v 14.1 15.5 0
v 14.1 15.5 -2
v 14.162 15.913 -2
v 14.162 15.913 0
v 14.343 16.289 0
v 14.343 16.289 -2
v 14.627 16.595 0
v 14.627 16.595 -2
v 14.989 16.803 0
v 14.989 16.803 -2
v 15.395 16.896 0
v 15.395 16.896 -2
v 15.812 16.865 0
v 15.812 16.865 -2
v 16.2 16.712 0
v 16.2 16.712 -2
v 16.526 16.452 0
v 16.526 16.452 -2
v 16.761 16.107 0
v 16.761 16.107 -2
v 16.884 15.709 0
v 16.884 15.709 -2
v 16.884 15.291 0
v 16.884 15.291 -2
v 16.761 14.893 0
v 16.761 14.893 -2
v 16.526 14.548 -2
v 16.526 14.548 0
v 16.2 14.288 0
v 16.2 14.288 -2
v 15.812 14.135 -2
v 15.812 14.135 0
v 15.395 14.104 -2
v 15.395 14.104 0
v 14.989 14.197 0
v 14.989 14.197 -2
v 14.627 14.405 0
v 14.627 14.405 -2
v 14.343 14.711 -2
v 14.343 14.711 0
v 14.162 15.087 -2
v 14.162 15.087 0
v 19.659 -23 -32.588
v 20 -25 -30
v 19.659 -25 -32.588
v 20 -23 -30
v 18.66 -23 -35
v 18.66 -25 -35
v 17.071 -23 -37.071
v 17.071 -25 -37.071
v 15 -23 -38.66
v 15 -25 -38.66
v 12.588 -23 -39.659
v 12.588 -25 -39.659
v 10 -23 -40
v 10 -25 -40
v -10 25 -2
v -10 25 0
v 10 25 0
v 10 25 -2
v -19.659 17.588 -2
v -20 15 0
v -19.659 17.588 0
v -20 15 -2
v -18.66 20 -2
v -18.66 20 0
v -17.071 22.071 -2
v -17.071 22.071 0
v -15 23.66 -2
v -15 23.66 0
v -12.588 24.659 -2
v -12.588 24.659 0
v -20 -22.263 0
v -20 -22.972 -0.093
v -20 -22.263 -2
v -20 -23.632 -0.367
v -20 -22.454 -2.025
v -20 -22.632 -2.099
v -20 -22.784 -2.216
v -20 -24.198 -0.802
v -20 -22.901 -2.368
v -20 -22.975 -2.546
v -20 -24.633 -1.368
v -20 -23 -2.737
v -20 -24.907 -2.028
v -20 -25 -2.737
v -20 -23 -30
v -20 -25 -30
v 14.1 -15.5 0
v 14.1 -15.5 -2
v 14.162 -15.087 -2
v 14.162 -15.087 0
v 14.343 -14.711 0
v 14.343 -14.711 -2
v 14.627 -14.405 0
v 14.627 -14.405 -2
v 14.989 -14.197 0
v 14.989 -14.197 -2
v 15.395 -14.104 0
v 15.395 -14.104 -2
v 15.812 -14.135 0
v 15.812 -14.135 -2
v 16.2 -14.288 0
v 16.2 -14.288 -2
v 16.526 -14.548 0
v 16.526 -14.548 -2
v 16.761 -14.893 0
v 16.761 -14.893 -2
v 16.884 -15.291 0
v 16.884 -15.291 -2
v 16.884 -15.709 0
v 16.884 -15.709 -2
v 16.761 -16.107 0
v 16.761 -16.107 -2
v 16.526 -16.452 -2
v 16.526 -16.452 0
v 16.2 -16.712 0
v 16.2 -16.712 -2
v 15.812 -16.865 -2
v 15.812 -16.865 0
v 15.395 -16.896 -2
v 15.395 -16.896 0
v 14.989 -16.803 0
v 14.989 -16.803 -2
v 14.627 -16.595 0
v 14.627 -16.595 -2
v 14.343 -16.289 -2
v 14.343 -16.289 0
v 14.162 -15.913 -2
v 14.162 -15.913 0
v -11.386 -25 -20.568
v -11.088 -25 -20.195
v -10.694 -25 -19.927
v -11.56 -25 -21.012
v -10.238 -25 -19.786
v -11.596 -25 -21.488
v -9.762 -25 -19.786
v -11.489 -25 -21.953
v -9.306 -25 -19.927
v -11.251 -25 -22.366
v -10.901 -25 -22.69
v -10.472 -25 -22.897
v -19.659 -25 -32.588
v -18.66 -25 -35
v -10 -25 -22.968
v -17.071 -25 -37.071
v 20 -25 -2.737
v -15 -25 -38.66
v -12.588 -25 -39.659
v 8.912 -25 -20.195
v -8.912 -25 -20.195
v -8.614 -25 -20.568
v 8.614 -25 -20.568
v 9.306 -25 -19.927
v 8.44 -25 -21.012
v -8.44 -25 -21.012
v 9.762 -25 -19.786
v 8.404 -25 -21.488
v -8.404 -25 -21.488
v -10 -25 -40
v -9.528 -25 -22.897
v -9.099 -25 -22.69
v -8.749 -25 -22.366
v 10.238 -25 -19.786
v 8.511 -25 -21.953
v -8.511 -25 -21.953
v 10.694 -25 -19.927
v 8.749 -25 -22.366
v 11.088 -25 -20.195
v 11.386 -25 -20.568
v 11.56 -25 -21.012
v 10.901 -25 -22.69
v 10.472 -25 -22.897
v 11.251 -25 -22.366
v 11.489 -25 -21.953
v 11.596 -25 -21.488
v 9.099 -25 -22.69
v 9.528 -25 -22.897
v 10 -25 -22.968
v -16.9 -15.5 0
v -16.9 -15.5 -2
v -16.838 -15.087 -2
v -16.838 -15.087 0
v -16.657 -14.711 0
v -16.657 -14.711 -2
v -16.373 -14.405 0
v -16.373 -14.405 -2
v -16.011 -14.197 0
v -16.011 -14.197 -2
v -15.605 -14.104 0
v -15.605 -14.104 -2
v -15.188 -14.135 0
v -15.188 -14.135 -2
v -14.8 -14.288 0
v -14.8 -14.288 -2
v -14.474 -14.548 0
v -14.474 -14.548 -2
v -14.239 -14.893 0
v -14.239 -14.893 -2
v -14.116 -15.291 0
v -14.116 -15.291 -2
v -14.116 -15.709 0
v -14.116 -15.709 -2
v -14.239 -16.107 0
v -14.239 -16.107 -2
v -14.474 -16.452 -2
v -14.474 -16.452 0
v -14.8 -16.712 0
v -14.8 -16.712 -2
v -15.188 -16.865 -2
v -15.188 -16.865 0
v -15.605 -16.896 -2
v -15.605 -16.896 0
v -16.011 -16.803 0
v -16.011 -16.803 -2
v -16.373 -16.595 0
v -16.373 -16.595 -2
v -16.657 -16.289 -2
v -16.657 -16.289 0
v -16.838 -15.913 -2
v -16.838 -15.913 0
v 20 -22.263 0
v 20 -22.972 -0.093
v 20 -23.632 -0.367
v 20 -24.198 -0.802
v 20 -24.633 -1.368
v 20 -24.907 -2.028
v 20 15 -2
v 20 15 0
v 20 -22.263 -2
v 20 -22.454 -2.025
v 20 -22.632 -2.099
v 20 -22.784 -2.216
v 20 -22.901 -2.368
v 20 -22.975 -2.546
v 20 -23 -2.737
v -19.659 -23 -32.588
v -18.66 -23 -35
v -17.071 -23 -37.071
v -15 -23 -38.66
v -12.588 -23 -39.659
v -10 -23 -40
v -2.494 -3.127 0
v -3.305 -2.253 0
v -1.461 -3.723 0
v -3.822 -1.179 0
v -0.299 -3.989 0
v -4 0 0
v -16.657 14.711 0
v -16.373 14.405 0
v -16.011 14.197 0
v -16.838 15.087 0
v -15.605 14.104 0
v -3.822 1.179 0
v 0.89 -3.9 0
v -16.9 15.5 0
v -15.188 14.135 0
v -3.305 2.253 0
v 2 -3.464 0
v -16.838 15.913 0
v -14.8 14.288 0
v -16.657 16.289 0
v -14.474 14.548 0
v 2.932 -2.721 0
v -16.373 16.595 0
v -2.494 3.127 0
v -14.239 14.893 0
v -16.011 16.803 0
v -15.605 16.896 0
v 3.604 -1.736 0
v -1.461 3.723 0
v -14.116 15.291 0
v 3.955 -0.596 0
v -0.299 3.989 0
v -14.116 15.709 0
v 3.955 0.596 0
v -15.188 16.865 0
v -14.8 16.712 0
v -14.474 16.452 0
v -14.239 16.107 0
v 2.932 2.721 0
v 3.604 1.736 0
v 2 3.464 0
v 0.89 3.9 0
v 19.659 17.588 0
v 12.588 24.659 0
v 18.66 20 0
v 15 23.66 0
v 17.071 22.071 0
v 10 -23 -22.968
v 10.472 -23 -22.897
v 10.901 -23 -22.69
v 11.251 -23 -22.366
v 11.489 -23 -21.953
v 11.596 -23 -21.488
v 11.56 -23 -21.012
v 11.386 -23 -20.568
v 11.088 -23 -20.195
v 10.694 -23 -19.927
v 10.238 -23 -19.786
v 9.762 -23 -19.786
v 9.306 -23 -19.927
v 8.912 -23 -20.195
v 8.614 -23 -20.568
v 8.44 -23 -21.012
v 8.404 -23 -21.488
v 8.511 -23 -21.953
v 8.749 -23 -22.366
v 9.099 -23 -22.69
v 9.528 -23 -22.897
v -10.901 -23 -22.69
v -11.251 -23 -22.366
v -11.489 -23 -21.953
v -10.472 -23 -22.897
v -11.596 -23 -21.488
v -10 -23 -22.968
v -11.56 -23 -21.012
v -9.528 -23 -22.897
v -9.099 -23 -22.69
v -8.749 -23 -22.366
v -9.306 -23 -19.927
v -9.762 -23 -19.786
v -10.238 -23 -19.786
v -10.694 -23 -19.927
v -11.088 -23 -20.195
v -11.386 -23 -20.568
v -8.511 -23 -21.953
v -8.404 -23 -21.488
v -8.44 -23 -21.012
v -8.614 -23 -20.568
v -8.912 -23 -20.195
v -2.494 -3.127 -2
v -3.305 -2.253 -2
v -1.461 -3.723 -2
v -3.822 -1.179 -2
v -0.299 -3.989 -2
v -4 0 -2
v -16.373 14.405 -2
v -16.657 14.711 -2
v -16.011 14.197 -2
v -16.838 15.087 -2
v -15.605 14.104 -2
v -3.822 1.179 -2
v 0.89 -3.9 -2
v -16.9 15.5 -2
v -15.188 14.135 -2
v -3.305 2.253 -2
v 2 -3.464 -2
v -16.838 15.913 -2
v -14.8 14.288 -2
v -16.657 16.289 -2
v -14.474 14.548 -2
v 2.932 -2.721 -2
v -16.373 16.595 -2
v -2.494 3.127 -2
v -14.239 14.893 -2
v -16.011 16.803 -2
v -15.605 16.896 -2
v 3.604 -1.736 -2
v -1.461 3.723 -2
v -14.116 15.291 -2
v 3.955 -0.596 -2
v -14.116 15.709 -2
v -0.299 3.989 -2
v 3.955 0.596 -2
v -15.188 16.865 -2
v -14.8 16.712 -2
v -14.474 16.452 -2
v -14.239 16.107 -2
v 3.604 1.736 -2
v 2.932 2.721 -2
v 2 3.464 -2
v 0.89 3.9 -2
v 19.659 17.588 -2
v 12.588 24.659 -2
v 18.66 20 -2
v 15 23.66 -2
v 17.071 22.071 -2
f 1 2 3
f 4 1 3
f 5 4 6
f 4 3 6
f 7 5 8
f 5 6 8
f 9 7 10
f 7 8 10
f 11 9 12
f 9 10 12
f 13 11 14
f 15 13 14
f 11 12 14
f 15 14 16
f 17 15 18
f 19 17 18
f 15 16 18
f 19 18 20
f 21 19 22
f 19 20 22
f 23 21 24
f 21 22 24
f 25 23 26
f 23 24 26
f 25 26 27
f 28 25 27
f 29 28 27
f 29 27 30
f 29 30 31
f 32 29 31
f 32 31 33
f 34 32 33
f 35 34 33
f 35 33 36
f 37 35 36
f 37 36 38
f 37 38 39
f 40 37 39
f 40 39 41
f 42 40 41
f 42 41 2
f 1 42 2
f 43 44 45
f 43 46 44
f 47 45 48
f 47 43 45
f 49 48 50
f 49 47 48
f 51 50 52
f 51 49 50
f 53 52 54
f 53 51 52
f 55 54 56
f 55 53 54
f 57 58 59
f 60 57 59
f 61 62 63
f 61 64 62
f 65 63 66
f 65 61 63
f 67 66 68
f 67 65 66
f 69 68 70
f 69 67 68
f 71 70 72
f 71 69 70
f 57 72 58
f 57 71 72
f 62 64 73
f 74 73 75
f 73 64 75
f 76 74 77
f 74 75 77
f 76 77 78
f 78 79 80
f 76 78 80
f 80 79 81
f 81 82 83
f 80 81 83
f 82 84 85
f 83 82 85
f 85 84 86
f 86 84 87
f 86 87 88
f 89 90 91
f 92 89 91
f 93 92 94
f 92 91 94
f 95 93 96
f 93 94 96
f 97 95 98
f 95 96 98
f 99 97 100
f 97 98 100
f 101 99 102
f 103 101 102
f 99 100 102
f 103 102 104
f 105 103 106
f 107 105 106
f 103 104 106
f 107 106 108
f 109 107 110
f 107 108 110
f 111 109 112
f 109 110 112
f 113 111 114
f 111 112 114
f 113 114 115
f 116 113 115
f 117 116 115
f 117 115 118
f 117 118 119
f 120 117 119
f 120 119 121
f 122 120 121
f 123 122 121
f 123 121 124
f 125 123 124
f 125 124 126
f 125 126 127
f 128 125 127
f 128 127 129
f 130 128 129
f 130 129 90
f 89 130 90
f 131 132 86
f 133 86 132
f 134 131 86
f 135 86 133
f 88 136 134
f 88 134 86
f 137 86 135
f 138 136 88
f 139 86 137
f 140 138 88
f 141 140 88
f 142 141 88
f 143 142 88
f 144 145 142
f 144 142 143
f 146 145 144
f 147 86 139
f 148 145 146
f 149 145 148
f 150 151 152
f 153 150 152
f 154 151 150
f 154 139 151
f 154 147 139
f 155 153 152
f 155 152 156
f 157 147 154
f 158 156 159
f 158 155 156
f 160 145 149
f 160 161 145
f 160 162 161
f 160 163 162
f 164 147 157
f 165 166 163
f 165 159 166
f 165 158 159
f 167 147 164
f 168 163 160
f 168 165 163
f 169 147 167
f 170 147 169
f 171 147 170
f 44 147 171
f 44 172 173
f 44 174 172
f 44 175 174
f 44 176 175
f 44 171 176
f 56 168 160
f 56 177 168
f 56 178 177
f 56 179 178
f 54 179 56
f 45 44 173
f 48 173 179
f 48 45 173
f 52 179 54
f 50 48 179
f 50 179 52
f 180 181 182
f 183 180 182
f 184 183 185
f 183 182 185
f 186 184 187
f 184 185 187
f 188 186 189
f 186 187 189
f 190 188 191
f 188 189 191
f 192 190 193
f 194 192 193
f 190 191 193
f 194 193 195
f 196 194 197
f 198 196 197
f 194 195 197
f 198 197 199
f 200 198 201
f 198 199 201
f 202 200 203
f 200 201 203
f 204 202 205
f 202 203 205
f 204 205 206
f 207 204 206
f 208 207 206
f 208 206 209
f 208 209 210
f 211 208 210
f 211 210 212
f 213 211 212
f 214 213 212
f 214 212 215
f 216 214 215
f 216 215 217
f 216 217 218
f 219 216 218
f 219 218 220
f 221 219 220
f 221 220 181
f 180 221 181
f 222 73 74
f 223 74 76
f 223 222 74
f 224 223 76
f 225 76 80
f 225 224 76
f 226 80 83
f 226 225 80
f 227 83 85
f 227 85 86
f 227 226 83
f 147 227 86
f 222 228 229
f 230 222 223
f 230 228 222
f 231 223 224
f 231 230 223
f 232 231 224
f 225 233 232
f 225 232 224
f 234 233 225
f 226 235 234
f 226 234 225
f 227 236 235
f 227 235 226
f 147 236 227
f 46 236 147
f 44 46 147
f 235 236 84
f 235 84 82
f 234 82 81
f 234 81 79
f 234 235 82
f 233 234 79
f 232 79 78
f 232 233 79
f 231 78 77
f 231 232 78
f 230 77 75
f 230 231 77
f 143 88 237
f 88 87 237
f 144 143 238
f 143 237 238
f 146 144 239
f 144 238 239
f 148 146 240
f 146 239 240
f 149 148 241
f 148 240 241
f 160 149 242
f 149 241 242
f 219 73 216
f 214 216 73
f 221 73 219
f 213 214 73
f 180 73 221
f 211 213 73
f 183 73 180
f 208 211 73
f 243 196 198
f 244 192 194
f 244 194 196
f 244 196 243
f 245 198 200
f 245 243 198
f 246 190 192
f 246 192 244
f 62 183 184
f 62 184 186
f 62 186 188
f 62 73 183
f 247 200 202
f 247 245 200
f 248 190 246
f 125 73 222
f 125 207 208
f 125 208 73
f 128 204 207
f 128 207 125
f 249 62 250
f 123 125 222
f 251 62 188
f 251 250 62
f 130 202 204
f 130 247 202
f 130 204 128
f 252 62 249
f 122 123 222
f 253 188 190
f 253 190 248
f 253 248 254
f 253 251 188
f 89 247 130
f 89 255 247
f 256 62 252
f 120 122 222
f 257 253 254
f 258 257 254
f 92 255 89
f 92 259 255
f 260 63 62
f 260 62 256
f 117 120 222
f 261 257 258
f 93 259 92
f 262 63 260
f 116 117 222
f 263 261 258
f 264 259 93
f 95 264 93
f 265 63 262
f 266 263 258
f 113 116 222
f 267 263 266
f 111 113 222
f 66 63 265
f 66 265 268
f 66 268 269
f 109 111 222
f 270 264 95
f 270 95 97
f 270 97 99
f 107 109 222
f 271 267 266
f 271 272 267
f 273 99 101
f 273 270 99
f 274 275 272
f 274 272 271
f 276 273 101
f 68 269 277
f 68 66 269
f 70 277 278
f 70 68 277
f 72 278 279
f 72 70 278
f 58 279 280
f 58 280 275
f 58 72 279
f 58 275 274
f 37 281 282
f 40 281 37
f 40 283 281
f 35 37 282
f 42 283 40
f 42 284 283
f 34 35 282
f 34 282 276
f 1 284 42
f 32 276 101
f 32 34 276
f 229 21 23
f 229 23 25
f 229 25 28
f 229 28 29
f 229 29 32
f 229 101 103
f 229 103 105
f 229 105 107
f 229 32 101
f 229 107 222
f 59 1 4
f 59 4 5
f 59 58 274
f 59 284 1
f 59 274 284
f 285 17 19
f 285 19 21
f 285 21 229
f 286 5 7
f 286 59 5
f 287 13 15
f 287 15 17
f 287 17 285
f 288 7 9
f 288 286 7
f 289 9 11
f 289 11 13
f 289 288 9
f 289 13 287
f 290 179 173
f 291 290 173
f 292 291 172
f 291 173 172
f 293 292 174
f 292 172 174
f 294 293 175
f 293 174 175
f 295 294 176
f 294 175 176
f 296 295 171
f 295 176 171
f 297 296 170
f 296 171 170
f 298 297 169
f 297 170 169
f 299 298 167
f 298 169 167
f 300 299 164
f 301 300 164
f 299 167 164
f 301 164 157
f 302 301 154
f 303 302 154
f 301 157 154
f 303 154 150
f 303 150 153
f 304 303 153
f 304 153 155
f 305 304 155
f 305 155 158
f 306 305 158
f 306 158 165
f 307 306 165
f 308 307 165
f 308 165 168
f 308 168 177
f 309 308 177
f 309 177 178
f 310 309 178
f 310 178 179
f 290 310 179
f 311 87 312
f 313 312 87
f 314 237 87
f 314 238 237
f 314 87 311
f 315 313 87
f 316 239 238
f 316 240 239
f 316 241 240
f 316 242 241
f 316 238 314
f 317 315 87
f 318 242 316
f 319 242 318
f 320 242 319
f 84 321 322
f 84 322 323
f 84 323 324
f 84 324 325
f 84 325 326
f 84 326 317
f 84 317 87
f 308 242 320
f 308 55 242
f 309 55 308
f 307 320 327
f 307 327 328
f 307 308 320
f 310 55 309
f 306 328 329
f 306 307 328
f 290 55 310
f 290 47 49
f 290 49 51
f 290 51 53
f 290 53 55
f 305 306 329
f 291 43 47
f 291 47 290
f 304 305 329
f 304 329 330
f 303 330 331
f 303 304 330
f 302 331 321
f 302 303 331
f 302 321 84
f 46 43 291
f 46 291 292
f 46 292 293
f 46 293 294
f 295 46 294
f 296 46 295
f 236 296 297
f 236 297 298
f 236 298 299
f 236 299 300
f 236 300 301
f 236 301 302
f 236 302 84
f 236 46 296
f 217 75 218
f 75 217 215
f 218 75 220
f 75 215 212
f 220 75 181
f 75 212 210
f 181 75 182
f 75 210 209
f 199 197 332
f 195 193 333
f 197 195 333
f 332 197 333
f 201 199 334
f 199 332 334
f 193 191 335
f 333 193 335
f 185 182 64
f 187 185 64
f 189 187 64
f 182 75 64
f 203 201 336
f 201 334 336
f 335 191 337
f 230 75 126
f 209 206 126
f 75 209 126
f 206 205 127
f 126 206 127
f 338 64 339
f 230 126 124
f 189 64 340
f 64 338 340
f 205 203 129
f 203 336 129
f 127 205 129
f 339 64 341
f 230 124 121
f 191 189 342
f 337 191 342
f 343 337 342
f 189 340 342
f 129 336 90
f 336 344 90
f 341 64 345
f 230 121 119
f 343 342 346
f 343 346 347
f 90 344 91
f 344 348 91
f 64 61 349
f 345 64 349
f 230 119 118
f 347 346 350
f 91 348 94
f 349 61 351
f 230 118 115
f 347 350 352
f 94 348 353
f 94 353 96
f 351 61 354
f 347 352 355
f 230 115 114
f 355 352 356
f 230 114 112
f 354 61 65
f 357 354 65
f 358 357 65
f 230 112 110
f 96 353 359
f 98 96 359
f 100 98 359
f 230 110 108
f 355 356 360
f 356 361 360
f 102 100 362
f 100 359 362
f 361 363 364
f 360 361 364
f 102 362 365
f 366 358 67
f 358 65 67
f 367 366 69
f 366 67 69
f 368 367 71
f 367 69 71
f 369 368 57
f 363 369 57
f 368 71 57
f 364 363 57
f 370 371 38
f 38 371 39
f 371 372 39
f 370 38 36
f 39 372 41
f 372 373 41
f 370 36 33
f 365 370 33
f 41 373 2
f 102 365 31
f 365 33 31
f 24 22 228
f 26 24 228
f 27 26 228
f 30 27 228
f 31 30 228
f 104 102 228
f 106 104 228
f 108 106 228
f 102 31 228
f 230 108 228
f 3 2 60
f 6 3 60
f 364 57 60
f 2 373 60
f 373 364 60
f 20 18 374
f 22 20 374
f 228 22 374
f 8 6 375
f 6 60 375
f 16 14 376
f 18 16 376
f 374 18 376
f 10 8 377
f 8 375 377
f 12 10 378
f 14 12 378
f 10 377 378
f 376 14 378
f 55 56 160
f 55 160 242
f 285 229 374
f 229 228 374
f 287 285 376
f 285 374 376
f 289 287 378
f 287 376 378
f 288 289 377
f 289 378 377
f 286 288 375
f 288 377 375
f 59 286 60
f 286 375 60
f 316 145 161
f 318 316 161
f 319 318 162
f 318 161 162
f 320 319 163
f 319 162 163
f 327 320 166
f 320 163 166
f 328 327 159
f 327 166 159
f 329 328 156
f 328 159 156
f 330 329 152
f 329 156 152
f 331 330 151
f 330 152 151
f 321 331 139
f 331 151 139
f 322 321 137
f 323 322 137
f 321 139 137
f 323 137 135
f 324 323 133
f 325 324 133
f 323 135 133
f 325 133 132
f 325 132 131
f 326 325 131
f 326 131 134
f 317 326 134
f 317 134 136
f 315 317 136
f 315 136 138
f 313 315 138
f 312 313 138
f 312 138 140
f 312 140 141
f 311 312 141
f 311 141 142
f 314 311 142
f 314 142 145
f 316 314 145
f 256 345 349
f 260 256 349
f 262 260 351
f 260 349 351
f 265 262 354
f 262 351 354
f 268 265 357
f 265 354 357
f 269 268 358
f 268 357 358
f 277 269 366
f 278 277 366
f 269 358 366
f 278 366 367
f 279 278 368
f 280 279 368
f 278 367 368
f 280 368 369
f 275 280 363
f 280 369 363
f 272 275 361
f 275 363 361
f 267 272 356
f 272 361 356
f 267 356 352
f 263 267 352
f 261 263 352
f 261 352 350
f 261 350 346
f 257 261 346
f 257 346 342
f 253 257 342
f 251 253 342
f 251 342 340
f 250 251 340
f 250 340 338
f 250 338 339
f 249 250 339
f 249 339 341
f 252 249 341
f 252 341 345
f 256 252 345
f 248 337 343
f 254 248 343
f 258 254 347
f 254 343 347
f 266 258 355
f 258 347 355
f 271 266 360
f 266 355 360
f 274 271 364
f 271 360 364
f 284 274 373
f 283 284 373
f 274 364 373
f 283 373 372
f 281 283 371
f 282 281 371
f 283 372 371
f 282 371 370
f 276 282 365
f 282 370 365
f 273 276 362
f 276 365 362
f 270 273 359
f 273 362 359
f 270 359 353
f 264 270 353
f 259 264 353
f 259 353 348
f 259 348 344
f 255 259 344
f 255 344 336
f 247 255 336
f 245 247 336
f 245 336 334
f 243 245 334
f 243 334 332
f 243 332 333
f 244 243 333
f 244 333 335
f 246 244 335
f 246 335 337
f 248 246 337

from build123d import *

# Parameters (mm, degrees)
SKETCH1_W                    = 40
SKETCH1_H                    = 50
BASE_FLANGE1_DEPTH           = 2
EDGE_FLANGE1_STRIP_W         = 9.4732
EDGE_FLANGE1_STRIP_H         = 2
EDGE_FLANGE1_STRIP_CUT_DEPTH = 40
EDGE_FLANGE1_DEPTH           = 40
CUT_EXTRUDE1_REACH           = 51.689
SKETCH9_R                    = 1.4
SKETCH9_R_2                  = 4
CUT_EXTRUDE2_REACH           = 69.082
SKETCH11_R                   = 1.6
FILLET1_R                    = 10


# Sheet-metal steps are written as plain solids
with BuildPart() as part:
    # Sketch1 → Base-Flange1 (new body)
    with BuildSketch(Plane.XY):
        Rectangle(SKETCH1_W, SKETCH1_H)
    extrude(amount=-BASE_FLANGE1_DEPTH)

    # Edge-Flange1 strip (across the edge) → Edge-Flange1 strip cut (cut)
    with BuildSketch(Plane(origin=(20, -25, -2), x_dir=(0, 1, 0), z_dir=(-1, 0, 0))):
        with Locations((-2, -1)):
            Rectangle(EDGE_FLANGE1_STRIP_W, EDGE_FLANGE1_STRIP_H)
    extrude(amount=EDGE_FLANGE1_STRIP_CUT_DEPTH, mode=Mode.SUBTRACT)

    # Edge-Flange1 section (across the edge) → Edge-Flange1 (add)
    with BuildSketch(Plane(origin=(20, -25, -2), x_dir=(0, 1, 0), z_dir=(-1, 0, 0))):
        with BuildLine():
            Line((0, 0.7366), (0, 38))
            Line((0, 38), (2, 38))
            Line((2, 38), (2, 0.7366))
            ThreePointArc((2, 0.7366), (2.215745145, 0.215745145), (2.7366, 0))
            Line((2.7366, 0), (2.7366, -2))
            ThreePointArc((2.7366, -2), (0.801531583, -1.198468417), (0, 0.7366))
        make_face()
    extrude(amount=EDGE_FLANGE1_DEPTH)

    # Sketch9 → Cut-Extrude1 (cut, up to next)
    with BuildSketch(Plane(origin=(0, 0, -2), x_dir=(-1, 0, 0), z_dir=(0, 0, -1)), mode=Mode.PRIVATE) as cut_extrude1_sk1:
        with Locations((-15.5, 15.5)):
            Circle(SKETCH9_R)
    cut_extrude1_tool1 = extrude(cut_extrude1_sk1.sketch, amount=-CUT_EXTRUDE1_REACH, mode=Mode.PRIVATE) & part.part
    # Sketch9 → Cut-Extrude1 (cut, up to next)
    with BuildSketch(Plane(origin=(0, 0, -2), x_dir=(-1, 0, 0), z_dir=(0, 0, -1)), mode=Mode.PRIVATE) as cut_extrude1_sk2:
        with Locations((15.5, 15.5)):
            Circle(SKETCH9_R)
    cut_extrude1_tool2 = extrude(cut_extrude1_sk2.sketch, amount=-CUT_EXTRUDE1_REACH, mode=Mode.PRIVATE) & part.part
    # Sketch9 → Cut-Extrude1 (cut, up to next)
    with BuildSketch(Plane(origin=(0, 0, -2), x_dir=(-1, 0, 0), z_dir=(0, 0, -1)), mode=Mode.PRIVATE) as cut_extrude1_sk3:
        with Locations((15.5, -15.5)):
            Circle(SKETCH9_R)
    cut_extrude1_tool3 = extrude(cut_extrude1_sk3.sketch, amount=-CUT_EXTRUDE1_REACH, mode=Mode.PRIVATE) & part.part
    # Sketch9 → Cut-Extrude1 (cut, up to next)
    with BuildSketch(Plane(origin=(0, 0, -2), x_dir=(-1, 0, 0), z_dir=(0, 0, -1)), mode=Mode.PRIVATE) as cut_extrude1_sk4:
        with Locations((-15.5, -15.5)):
            Circle(SKETCH9_R)
    cut_extrude1_tool4 = extrude(cut_extrude1_sk4.sketch, amount=-CUT_EXTRUDE1_REACH, mode=Mode.PRIVATE) & part.part
    # Sketch9 → Cut-Extrude1 (cut, up to next)
    with BuildSketch(Plane(origin=(0, 0, -2), x_dir=(-1, 0, 0), z_dir=(0, 0, -1)), mode=Mode.PRIVATE) as cut_extrude1_sk5:
        Circle(SKETCH9_R_2)
    cut_extrude1_tool5 = extrude(cut_extrude1_sk5.sketch, amount=-CUT_EXTRUDE1_REACH, mode=Mode.PRIVATE) & part.part
    add(cut_extrude1_tool1.solids().sort_by_distance((15.5, 15.5, -2))[0], mode=Mode.SUBTRACT)
    add(cut_extrude1_tool2.solids().sort_by_distance((-15.5, 15.5, -2))[0], mode=Mode.SUBTRACT)
    add(cut_extrude1_tool3.solids().sort_by_distance((-15.5, -15.5, -2))[0], mode=Mode.SUBTRACT)
    add(cut_extrude1_tool4.solids().sort_by_distance((15.5, -15.5, -2))[0], mode=Mode.SUBTRACT)
    add(cut_extrude1_tool5.solids().sort_by_distance((0, 0, -2))[0], mode=Mode.SUBTRACT)

    # Sketch11 → Cut-Extrude2 (cut, up to next)
    with BuildSketch(Plane.XZ.offset(25), mode=Mode.PRIVATE) as cut_extrude2_sk1:
        with Locations(Location((-10, -21.3683, 0), (0, 0, 270))):
            Circle(SKETCH11_R)
    cut_extrude2_tool1 = extrude(cut_extrude2_sk1.sketch, amount=-CUT_EXTRUDE2_REACH, mode=Mode.PRIVATE) & part.part
    # Sketch11 → Cut-Extrude2 (cut, up to next)
    with BuildSketch(Plane.XZ.offset(25), mode=Mode.PRIVATE) as cut_extrude2_sk2:
        with Locations(Location((10, -21.3683, 0), (0, 0, 270))):
            Circle(SKETCH11_R)
    cut_extrude2_tool2 = extrude(cut_extrude2_sk2.sketch, amount=-CUT_EXTRUDE2_REACH, mode=Mode.PRIVATE) & part.part
    add(cut_extrude2_tool1.solids().sort_by_distance((-10, -25, -21.3683))[0], mode=Mode.SUBTRACT)
    add(cut_extrude2_tool2.solids().sort_by_distance((10, -25, -21.3683))[0], mode=Mode.SUBTRACT)

    # Fillet1
    fillet1_edges = [part.edges().sort_by_distance(p)[0] for p in [
        (20, -24, -40),
        (-20, -24, -40),
        (-20, 25, -1),
        (20, 25, -1),
    ]]
    fillet(fillet1_edges, radius=FILLET1_R)


solid = part.part
